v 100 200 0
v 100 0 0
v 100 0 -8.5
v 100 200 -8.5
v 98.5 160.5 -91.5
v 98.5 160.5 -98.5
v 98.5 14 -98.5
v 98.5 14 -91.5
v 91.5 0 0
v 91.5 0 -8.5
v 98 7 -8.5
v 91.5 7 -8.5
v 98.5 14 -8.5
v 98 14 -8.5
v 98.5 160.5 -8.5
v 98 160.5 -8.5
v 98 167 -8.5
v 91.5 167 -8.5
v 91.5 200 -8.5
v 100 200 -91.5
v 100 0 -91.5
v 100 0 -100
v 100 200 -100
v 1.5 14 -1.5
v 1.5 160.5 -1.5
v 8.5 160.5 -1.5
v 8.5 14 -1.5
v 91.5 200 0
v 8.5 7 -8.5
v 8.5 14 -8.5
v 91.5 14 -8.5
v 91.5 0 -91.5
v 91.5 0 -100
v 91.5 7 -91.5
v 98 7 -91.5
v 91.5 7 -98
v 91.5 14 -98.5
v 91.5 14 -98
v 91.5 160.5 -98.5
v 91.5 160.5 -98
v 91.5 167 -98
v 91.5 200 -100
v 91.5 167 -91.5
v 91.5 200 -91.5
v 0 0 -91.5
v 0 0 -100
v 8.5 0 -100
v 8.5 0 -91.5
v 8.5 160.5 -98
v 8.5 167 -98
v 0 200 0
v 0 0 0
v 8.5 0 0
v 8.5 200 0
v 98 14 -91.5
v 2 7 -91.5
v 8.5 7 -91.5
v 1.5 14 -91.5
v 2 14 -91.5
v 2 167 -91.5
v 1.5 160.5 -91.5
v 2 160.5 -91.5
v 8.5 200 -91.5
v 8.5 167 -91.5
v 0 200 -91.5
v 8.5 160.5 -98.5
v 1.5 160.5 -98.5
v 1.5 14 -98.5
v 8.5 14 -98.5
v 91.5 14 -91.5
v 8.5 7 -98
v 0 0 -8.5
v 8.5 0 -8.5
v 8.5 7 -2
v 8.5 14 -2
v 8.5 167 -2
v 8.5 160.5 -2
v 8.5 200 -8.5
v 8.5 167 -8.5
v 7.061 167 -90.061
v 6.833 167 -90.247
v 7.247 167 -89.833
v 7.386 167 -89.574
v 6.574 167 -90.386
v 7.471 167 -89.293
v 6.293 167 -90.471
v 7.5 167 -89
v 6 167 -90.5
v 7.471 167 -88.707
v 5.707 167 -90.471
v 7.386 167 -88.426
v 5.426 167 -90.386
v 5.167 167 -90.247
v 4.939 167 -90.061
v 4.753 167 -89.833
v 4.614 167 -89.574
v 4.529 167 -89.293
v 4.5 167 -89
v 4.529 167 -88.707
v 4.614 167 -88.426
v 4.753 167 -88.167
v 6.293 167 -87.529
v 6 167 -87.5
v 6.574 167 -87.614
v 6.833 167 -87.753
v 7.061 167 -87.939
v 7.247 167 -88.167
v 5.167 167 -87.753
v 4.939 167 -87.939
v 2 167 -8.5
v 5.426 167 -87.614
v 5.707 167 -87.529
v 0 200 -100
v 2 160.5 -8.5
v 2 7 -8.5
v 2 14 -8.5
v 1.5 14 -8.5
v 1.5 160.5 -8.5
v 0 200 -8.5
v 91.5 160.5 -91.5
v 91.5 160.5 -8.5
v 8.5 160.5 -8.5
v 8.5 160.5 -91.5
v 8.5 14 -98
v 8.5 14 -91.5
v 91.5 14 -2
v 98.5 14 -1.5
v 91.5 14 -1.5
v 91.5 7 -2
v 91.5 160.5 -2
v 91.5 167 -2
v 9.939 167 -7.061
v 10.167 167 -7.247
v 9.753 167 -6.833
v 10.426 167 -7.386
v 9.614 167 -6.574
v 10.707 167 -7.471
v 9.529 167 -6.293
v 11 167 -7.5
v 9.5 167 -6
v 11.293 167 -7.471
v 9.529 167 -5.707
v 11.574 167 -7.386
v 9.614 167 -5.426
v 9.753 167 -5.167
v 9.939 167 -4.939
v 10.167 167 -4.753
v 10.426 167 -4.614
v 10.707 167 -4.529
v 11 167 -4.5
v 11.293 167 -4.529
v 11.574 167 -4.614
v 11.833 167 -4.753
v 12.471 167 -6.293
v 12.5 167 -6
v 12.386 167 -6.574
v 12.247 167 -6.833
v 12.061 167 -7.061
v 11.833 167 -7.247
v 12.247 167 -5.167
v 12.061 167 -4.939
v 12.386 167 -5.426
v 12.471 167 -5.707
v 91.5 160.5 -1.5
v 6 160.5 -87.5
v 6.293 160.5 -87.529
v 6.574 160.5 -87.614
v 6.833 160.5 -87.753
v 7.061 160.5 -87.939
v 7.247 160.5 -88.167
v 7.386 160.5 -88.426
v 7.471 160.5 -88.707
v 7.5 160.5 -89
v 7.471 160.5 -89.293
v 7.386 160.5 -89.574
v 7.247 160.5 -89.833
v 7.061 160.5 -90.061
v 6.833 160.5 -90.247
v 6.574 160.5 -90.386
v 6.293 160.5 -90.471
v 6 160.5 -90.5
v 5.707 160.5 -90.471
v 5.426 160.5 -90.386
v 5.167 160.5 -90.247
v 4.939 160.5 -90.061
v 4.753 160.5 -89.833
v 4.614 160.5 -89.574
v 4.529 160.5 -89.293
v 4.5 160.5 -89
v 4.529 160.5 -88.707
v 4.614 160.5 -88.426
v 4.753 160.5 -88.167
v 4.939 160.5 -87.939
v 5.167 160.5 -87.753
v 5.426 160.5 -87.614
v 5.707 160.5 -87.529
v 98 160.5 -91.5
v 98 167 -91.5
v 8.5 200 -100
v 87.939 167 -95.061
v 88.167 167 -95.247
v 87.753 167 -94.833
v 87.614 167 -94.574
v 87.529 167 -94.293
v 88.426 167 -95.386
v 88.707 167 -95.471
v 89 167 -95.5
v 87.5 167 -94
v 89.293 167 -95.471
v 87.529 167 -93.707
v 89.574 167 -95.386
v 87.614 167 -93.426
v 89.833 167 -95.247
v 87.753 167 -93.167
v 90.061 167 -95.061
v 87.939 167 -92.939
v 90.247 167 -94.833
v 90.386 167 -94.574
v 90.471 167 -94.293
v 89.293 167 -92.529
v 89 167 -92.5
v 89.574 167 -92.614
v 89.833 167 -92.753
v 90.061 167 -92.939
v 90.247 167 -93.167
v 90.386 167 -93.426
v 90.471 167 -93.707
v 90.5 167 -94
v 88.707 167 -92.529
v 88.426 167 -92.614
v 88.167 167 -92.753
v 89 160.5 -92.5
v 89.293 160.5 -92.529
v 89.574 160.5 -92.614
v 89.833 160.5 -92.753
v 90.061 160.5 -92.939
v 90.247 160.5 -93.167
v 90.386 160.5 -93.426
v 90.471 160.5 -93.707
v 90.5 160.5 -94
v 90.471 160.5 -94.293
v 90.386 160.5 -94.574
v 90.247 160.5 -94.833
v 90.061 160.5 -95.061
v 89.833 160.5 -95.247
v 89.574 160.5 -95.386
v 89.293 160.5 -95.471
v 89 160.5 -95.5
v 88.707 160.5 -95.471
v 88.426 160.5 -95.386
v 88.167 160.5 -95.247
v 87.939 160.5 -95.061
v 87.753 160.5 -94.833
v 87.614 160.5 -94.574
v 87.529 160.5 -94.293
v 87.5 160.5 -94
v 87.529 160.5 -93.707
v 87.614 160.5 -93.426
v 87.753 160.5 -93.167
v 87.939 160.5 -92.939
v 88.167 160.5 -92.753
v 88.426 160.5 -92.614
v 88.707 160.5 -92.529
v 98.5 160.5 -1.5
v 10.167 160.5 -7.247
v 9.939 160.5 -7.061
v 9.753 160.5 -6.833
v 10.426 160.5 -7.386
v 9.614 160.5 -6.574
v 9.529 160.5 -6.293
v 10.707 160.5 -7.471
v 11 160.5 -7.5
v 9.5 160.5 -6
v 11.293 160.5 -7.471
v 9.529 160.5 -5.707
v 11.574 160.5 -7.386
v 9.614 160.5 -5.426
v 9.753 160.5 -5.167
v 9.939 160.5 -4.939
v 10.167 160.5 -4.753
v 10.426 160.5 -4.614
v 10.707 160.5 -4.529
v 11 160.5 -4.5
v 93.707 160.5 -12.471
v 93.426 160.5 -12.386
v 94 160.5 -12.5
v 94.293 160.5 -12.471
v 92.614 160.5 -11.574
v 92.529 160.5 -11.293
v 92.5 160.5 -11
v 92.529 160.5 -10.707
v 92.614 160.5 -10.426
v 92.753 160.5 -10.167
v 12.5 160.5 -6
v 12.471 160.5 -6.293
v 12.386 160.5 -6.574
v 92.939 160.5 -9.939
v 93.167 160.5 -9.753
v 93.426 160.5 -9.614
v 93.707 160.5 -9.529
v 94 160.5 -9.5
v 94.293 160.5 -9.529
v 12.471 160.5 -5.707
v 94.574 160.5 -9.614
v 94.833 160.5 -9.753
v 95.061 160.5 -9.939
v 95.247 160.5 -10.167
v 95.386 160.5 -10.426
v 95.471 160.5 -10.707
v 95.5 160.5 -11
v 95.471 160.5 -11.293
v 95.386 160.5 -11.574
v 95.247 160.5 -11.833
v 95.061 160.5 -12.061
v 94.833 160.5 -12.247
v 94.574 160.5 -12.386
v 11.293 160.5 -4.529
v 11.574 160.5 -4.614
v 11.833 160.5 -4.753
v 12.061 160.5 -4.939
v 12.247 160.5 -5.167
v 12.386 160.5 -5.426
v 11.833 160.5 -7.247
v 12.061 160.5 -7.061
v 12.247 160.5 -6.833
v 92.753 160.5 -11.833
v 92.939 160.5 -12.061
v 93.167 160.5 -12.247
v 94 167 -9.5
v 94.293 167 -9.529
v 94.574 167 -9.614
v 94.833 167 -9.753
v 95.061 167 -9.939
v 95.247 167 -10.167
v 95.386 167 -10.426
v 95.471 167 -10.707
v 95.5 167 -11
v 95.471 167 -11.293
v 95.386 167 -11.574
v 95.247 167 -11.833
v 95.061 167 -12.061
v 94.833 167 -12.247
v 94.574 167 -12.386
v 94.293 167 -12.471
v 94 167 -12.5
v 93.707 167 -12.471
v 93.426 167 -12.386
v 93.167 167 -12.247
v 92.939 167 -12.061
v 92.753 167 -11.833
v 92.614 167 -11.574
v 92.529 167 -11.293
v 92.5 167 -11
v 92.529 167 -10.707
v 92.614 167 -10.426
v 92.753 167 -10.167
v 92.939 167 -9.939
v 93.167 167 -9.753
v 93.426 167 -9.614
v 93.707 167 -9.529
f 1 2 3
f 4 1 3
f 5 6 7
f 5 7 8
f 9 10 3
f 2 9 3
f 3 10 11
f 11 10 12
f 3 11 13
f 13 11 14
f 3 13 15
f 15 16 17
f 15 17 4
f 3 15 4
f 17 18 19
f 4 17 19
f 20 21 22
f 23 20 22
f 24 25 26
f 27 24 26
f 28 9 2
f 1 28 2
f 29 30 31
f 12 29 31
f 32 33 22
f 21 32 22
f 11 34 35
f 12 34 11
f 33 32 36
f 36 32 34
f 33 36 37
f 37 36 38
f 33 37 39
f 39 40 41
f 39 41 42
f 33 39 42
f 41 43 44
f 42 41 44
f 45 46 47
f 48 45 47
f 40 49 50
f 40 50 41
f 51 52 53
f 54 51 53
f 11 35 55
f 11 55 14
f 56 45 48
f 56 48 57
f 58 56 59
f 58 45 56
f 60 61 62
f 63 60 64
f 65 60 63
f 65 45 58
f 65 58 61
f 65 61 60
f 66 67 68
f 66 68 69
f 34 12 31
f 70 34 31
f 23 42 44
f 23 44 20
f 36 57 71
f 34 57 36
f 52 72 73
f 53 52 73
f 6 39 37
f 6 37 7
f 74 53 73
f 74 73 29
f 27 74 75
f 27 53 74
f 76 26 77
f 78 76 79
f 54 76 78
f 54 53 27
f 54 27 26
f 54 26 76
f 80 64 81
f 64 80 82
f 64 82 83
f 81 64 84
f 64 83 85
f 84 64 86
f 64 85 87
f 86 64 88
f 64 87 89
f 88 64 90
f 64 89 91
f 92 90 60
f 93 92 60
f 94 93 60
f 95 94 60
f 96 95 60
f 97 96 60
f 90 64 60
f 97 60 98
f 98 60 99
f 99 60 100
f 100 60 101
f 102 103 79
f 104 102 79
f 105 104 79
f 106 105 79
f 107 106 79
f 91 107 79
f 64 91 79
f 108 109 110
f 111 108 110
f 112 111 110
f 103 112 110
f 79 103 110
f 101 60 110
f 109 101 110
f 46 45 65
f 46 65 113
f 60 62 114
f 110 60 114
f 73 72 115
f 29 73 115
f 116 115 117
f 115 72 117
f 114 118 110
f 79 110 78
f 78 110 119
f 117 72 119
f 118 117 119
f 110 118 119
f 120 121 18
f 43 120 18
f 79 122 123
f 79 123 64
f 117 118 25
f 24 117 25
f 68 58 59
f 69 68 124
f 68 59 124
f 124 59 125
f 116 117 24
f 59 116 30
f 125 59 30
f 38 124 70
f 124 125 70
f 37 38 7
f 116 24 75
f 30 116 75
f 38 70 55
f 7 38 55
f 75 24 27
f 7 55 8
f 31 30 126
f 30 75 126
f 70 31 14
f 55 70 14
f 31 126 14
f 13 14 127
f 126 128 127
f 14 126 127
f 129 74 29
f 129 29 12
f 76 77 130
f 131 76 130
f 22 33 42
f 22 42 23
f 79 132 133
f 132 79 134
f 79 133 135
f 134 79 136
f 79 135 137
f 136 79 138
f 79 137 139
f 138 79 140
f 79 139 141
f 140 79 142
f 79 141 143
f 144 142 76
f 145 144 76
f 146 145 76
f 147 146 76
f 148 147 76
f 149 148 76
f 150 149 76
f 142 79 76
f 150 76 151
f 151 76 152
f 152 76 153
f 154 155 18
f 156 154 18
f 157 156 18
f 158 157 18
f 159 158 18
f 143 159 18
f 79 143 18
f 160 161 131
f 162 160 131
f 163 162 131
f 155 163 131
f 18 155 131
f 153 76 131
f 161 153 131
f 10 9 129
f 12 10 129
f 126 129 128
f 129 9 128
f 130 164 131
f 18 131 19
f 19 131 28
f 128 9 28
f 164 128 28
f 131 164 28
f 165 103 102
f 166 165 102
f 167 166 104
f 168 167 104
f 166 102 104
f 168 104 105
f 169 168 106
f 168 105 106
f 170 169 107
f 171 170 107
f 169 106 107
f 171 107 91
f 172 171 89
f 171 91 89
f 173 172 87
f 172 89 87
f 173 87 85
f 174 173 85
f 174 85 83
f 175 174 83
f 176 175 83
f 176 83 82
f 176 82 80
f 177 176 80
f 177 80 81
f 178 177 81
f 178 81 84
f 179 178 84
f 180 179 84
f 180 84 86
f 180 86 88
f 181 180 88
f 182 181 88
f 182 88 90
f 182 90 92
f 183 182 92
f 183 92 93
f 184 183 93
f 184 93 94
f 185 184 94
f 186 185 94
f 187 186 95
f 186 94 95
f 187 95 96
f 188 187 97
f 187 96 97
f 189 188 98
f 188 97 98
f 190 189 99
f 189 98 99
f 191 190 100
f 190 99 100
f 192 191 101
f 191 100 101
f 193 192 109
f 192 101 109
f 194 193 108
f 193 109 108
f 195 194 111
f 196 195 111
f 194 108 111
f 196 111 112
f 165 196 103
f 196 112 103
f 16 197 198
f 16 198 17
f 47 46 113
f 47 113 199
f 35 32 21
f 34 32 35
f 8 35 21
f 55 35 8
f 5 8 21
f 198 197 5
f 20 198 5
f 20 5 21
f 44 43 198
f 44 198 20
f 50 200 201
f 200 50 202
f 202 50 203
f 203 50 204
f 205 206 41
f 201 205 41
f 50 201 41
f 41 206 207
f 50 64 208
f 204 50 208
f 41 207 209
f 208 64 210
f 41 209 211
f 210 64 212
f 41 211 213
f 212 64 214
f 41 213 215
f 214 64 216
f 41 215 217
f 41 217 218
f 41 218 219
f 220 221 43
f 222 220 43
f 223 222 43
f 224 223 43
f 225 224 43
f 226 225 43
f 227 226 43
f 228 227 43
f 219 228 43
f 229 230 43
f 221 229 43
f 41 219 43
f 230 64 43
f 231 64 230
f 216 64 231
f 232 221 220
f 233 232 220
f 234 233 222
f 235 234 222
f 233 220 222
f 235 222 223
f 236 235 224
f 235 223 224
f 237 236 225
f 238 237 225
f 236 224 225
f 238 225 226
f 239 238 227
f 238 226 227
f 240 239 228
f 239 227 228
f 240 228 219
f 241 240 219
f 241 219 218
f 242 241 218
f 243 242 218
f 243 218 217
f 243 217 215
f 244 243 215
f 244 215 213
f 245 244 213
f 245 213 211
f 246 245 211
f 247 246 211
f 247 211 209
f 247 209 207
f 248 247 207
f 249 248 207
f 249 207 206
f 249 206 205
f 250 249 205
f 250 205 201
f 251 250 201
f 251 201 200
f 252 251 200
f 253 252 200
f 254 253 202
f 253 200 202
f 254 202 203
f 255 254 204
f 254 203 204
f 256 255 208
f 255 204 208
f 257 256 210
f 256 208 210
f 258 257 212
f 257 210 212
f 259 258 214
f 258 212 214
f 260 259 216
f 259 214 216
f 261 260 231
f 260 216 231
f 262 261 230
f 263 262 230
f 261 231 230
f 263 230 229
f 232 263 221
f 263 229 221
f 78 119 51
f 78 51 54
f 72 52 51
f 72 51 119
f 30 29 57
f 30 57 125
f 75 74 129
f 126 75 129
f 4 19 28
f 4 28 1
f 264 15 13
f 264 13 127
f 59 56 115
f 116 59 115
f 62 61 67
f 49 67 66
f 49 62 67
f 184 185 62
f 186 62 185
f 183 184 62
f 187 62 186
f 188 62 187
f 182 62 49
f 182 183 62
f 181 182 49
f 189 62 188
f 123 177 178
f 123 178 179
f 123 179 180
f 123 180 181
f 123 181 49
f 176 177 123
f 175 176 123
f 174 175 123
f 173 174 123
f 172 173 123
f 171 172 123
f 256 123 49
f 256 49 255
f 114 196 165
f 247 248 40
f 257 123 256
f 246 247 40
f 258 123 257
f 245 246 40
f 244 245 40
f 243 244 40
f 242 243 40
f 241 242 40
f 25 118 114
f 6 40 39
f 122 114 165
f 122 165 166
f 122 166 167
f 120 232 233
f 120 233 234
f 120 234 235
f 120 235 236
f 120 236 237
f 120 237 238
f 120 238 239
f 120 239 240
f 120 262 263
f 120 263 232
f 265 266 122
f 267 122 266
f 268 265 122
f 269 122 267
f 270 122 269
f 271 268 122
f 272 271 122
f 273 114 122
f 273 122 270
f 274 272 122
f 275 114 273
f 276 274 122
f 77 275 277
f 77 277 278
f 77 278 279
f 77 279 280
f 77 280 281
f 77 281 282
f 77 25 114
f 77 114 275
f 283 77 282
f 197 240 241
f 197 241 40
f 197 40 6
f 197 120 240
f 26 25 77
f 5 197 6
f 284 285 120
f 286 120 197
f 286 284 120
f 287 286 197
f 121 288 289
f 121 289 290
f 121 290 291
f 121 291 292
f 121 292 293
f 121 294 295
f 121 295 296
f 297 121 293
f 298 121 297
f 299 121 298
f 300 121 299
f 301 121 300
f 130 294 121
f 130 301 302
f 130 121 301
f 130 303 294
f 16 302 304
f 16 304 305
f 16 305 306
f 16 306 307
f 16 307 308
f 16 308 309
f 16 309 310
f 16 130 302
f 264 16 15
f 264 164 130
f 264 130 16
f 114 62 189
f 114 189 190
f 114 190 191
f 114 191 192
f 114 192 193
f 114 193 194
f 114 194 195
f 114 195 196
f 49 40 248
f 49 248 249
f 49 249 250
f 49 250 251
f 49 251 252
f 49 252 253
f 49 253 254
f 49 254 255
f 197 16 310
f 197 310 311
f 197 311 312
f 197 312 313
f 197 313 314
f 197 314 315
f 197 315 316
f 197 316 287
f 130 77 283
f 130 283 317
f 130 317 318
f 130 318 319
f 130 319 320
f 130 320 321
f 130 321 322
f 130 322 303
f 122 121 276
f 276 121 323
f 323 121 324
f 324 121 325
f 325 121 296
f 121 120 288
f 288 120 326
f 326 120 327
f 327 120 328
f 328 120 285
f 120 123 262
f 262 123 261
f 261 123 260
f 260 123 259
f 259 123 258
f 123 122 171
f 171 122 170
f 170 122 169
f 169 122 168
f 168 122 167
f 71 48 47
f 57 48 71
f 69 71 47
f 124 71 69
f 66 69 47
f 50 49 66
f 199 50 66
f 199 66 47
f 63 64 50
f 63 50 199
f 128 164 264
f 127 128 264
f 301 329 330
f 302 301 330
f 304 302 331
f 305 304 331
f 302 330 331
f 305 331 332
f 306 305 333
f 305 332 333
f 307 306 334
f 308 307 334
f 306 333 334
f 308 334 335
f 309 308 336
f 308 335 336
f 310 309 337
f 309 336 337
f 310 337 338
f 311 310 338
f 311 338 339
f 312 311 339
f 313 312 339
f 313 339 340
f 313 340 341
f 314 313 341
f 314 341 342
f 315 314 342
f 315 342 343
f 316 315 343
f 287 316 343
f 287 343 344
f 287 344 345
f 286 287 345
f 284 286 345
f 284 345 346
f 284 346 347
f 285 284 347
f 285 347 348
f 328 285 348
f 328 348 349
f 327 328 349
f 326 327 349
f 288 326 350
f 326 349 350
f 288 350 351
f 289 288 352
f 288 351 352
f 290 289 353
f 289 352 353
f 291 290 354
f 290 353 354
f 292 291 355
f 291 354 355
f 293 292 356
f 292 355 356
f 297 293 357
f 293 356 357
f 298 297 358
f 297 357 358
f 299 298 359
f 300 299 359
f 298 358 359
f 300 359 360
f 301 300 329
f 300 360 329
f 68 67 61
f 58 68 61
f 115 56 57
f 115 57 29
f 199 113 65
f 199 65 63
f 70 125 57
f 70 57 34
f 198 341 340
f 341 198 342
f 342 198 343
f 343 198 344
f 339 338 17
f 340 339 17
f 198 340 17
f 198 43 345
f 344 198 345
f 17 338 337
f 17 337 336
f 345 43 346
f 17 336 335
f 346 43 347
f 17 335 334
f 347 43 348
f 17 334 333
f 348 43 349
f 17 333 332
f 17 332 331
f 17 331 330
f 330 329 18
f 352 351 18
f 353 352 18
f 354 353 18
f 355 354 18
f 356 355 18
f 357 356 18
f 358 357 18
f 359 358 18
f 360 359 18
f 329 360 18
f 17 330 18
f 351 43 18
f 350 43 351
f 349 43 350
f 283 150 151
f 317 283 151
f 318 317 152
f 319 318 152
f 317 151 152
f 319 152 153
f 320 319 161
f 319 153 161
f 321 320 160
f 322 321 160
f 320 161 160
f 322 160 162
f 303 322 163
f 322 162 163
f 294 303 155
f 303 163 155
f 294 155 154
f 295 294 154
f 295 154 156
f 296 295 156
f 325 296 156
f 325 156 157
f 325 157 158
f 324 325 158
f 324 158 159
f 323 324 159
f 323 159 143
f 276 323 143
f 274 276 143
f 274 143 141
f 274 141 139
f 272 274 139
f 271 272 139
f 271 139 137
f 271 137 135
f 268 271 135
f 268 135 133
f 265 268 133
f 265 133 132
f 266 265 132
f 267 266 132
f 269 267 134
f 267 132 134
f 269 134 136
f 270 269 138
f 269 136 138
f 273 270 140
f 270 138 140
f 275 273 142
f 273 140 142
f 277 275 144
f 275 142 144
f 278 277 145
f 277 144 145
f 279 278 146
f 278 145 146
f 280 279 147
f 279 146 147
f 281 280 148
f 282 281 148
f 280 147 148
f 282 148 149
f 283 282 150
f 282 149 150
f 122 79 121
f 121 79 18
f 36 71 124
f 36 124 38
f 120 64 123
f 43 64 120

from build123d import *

# Parameters (mm, degrees)
SKETCH1_W           = 100
SKETCH1_H           = 100
BOSS_EXTRUDE1_DEPTH = 200
SKETCH2_W           = 83
SKETCH2_H           = 83
CUT_EXTRUDE1_DEPTH  = 200
SKETCH3_W           = 83
SKETCH3_H           = 14
SKETCH3_H_2         = 146.5
SKETCH3_H_3         = 66
CUT_EXTRUDE2_DEPTH  = 200
SKETCH4_W           = 83
SKETCH4_H           = 14
SKETCH4_H_2         = 146.5
SKETCH4_H_3         = 66
CUT_EXTRUDE3_DEPTH  = 200
SKETCH5_W           = 83
SKETCH5_H           = 4
SKETCH5_W_2         = 4
SKETCH5_H_2         = 83
CUT_EXTRUDE4_DEPTH  = 200
SKETCH8_W           = 97
SKETCH8_H           = 97
CUT_EXTRUDE5_DEPTH  = 146.5
CUT_EXTRUDE6_REACH  = 220.836
SKETCH9_R           = 1.5


with BuildPart() as part:
    # Sketch1 → Boss-Extrude1 (new body)
    with BuildSketch(Plane(origin=(0, 0, 0), x_dir=(1, 0, 0), z_dir=(0, 1, 0))):
        with Locations((50, 50)):
            Rectangle(SKETCH1_W, SKETCH1_H)
    extrude(amount=BOSS_EXTRUDE1_DEPTH)

    # Sketch2 → Cut-Extrude1 (cut)
    with BuildSketch(Plane(origin=(0, 200, 0), x_dir=(1, 0, 0), z_dir=(0, 1, 0))):
        with Locations((50, 50)):
            Rectangle(SKETCH2_W, SKETCH2_H)
    extrude(amount=-CUT_EXTRUDE1_DEPTH, mode=Mode.SUBTRACT)

    # Sketch3 → Cut-Extrude2 (cut)
    with BuildSketch(Plane.XY):
        with Locations((50, 0)):
            Rectangle(SKETCH3_W, SKETCH3_H)
        with Locations((50, 87.25)):
            Rectangle(SKETCH3_W, SKETCH3_H_2)
        with Locations((50, 200)):
            Rectangle(SKETCH3_W, SKETCH3_H_3)
    extrude(amount=-CUT_EXTRUDE2_DEPTH, mode=Mode.SUBTRACT)

    # Sketch4 → Cut-Extrude3 (cut)
    with BuildSketch(Plane.ZY):
        with Locations((-50, 0)):
            Rectangle(SKETCH4_W, SKETCH4_H)
        with Locations((-50, 87.25)):
            Rectangle(SKETCH4_W, SKETCH4_H_2)
        with Locations((-50, 200)):
            Rectangle(SKETCH4_W, SKETCH4_H_3)
    extrude(amount=-CUT_EXTRUDE3_DEPTH, mode=Mode.SUBTRACT)

    # Sketch5 → Cut-Extrude4 (cut)
    with BuildSketch(Plane.XZ.offset(-7)):
        with Locations((50, 0)):
            Rectangle(SKETCH5_W, SKETCH5_H)
        with Locations((100, -50)):
            Rectangle(SKETCH5_W_2, SKETCH5_H_2)
        with Locations((50, -100)):
            Rectangle(SKETCH5_W, SKETCH5_H)
        with Locations((0, -50)):
            Rectangle(SKETCH5_W_2, SKETCH5_H_2)
    extrude(amount=-CUT_EXTRUDE4_DEPTH, mode=Mode.SUBTRACT)

    # Sketch8 → Cut-Extrude5 (cut)
    with BuildSketch(Plane.XZ.offset(-160.5)):
        with Locations((50, -50)):
            Rectangle(SKETCH8_W, SKETCH8_H)
    extrude(amount=CUT_EXTRUDE5_DEPTH, mode=Mode.SUBTRACT)

    # Sketch9 → Cut-Extrude6 (cut, up to next)
    with BuildSketch(Plane(origin=(0, 167, 0), x_dir=(1, 0, 0), z_dir=(0, 1, 0)), mode=Mode.PRIVATE) as cut_extrude6_sk1:
        with Locations(Location((6, 89, 0), (0, 0, 270))):
            Circle(SKETCH9_R)
    cut_extrude6_tool1 = extrude(cut_extrude6_sk1.sketch, amount=-CUT_EXTRUDE6_REACH, mode=Mode.PRIVATE) & part.part
    # Sketch9 → Cut-Extrude6 (cut, up to next)
    with BuildSketch(Plane(origin=(0, 167, 0), x_dir=(1, 0, 0), z_dir=(0, 1, 0)), mode=Mode.PRIVATE) as cut_extrude6_sk2:
        with Locations(Location((89, 94, 0), (0, 0, 270))):
            Circle(SKETCH9_R)
    cut_extrude6_tool2 = extrude(cut_extrude6_sk2.sketch, amount=-CUT_EXTRUDE6_REACH, mode=Mode.PRIVATE) & part.part
    # Sketch9 → Cut-Extrude6 (cut, up to next)
    with BuildSketch(Plane(origin=(0, 167, 0), x_dir=(1, 0, 0), z_dir=(0, 1, 0)), mode=Mode.PRIVATE) as cut_extrude6_sk3:
        with Locations(Location((94, 11, 0), (0, 0, 270))):
            Circle(SKETCH9_R)
    cut_extrude6_tool3 = extrude(cut_extrude6_sk3.sketch, amount=-CUT_EXTRUDE6_REACH, mode=Mode.PRIVATE) & part.part
    # Sketch9 → Cut-Extrude6 (cut, up to next)
    with BuildSketch(Plane(origin=(0, 167, 0), x_dir=(1, 0, 0), z_dir=(0, 1, 0)), mode=Mode.PRIVATE) as cut_extrude6_sk4:
        with Locations(Location((11, 6, 0), (0, 0, 270))):
            Circle(SKETCH9_R)
    cut_extrude6_tool4 = extrude(cut_extrude6_sk4.sketch, amount=-CUT_EXTRUDE6_REACH, mode=Mode.PRIVATE) & part.part
    add(cut_extrude6_tool1.solids().sort_by_distance((6, 167, -89))[0], mode=Mode.SUBTRACT)
    add(cut_extrude6_tool2.solids().sort_by_distance((89, 167, -94))[0], mode=Mode.SUBTRACT)
    add(cut_extrude6_tool3.solids().sort_by_distance((94, 167, -11))[0], mode=Mode.SUBTRACT)
    add(cut_extrude6_tool4.solids().sort_by_distance((11, 167, -6))[0], mode=Mode.SUBTRACT)


solid = part.part
